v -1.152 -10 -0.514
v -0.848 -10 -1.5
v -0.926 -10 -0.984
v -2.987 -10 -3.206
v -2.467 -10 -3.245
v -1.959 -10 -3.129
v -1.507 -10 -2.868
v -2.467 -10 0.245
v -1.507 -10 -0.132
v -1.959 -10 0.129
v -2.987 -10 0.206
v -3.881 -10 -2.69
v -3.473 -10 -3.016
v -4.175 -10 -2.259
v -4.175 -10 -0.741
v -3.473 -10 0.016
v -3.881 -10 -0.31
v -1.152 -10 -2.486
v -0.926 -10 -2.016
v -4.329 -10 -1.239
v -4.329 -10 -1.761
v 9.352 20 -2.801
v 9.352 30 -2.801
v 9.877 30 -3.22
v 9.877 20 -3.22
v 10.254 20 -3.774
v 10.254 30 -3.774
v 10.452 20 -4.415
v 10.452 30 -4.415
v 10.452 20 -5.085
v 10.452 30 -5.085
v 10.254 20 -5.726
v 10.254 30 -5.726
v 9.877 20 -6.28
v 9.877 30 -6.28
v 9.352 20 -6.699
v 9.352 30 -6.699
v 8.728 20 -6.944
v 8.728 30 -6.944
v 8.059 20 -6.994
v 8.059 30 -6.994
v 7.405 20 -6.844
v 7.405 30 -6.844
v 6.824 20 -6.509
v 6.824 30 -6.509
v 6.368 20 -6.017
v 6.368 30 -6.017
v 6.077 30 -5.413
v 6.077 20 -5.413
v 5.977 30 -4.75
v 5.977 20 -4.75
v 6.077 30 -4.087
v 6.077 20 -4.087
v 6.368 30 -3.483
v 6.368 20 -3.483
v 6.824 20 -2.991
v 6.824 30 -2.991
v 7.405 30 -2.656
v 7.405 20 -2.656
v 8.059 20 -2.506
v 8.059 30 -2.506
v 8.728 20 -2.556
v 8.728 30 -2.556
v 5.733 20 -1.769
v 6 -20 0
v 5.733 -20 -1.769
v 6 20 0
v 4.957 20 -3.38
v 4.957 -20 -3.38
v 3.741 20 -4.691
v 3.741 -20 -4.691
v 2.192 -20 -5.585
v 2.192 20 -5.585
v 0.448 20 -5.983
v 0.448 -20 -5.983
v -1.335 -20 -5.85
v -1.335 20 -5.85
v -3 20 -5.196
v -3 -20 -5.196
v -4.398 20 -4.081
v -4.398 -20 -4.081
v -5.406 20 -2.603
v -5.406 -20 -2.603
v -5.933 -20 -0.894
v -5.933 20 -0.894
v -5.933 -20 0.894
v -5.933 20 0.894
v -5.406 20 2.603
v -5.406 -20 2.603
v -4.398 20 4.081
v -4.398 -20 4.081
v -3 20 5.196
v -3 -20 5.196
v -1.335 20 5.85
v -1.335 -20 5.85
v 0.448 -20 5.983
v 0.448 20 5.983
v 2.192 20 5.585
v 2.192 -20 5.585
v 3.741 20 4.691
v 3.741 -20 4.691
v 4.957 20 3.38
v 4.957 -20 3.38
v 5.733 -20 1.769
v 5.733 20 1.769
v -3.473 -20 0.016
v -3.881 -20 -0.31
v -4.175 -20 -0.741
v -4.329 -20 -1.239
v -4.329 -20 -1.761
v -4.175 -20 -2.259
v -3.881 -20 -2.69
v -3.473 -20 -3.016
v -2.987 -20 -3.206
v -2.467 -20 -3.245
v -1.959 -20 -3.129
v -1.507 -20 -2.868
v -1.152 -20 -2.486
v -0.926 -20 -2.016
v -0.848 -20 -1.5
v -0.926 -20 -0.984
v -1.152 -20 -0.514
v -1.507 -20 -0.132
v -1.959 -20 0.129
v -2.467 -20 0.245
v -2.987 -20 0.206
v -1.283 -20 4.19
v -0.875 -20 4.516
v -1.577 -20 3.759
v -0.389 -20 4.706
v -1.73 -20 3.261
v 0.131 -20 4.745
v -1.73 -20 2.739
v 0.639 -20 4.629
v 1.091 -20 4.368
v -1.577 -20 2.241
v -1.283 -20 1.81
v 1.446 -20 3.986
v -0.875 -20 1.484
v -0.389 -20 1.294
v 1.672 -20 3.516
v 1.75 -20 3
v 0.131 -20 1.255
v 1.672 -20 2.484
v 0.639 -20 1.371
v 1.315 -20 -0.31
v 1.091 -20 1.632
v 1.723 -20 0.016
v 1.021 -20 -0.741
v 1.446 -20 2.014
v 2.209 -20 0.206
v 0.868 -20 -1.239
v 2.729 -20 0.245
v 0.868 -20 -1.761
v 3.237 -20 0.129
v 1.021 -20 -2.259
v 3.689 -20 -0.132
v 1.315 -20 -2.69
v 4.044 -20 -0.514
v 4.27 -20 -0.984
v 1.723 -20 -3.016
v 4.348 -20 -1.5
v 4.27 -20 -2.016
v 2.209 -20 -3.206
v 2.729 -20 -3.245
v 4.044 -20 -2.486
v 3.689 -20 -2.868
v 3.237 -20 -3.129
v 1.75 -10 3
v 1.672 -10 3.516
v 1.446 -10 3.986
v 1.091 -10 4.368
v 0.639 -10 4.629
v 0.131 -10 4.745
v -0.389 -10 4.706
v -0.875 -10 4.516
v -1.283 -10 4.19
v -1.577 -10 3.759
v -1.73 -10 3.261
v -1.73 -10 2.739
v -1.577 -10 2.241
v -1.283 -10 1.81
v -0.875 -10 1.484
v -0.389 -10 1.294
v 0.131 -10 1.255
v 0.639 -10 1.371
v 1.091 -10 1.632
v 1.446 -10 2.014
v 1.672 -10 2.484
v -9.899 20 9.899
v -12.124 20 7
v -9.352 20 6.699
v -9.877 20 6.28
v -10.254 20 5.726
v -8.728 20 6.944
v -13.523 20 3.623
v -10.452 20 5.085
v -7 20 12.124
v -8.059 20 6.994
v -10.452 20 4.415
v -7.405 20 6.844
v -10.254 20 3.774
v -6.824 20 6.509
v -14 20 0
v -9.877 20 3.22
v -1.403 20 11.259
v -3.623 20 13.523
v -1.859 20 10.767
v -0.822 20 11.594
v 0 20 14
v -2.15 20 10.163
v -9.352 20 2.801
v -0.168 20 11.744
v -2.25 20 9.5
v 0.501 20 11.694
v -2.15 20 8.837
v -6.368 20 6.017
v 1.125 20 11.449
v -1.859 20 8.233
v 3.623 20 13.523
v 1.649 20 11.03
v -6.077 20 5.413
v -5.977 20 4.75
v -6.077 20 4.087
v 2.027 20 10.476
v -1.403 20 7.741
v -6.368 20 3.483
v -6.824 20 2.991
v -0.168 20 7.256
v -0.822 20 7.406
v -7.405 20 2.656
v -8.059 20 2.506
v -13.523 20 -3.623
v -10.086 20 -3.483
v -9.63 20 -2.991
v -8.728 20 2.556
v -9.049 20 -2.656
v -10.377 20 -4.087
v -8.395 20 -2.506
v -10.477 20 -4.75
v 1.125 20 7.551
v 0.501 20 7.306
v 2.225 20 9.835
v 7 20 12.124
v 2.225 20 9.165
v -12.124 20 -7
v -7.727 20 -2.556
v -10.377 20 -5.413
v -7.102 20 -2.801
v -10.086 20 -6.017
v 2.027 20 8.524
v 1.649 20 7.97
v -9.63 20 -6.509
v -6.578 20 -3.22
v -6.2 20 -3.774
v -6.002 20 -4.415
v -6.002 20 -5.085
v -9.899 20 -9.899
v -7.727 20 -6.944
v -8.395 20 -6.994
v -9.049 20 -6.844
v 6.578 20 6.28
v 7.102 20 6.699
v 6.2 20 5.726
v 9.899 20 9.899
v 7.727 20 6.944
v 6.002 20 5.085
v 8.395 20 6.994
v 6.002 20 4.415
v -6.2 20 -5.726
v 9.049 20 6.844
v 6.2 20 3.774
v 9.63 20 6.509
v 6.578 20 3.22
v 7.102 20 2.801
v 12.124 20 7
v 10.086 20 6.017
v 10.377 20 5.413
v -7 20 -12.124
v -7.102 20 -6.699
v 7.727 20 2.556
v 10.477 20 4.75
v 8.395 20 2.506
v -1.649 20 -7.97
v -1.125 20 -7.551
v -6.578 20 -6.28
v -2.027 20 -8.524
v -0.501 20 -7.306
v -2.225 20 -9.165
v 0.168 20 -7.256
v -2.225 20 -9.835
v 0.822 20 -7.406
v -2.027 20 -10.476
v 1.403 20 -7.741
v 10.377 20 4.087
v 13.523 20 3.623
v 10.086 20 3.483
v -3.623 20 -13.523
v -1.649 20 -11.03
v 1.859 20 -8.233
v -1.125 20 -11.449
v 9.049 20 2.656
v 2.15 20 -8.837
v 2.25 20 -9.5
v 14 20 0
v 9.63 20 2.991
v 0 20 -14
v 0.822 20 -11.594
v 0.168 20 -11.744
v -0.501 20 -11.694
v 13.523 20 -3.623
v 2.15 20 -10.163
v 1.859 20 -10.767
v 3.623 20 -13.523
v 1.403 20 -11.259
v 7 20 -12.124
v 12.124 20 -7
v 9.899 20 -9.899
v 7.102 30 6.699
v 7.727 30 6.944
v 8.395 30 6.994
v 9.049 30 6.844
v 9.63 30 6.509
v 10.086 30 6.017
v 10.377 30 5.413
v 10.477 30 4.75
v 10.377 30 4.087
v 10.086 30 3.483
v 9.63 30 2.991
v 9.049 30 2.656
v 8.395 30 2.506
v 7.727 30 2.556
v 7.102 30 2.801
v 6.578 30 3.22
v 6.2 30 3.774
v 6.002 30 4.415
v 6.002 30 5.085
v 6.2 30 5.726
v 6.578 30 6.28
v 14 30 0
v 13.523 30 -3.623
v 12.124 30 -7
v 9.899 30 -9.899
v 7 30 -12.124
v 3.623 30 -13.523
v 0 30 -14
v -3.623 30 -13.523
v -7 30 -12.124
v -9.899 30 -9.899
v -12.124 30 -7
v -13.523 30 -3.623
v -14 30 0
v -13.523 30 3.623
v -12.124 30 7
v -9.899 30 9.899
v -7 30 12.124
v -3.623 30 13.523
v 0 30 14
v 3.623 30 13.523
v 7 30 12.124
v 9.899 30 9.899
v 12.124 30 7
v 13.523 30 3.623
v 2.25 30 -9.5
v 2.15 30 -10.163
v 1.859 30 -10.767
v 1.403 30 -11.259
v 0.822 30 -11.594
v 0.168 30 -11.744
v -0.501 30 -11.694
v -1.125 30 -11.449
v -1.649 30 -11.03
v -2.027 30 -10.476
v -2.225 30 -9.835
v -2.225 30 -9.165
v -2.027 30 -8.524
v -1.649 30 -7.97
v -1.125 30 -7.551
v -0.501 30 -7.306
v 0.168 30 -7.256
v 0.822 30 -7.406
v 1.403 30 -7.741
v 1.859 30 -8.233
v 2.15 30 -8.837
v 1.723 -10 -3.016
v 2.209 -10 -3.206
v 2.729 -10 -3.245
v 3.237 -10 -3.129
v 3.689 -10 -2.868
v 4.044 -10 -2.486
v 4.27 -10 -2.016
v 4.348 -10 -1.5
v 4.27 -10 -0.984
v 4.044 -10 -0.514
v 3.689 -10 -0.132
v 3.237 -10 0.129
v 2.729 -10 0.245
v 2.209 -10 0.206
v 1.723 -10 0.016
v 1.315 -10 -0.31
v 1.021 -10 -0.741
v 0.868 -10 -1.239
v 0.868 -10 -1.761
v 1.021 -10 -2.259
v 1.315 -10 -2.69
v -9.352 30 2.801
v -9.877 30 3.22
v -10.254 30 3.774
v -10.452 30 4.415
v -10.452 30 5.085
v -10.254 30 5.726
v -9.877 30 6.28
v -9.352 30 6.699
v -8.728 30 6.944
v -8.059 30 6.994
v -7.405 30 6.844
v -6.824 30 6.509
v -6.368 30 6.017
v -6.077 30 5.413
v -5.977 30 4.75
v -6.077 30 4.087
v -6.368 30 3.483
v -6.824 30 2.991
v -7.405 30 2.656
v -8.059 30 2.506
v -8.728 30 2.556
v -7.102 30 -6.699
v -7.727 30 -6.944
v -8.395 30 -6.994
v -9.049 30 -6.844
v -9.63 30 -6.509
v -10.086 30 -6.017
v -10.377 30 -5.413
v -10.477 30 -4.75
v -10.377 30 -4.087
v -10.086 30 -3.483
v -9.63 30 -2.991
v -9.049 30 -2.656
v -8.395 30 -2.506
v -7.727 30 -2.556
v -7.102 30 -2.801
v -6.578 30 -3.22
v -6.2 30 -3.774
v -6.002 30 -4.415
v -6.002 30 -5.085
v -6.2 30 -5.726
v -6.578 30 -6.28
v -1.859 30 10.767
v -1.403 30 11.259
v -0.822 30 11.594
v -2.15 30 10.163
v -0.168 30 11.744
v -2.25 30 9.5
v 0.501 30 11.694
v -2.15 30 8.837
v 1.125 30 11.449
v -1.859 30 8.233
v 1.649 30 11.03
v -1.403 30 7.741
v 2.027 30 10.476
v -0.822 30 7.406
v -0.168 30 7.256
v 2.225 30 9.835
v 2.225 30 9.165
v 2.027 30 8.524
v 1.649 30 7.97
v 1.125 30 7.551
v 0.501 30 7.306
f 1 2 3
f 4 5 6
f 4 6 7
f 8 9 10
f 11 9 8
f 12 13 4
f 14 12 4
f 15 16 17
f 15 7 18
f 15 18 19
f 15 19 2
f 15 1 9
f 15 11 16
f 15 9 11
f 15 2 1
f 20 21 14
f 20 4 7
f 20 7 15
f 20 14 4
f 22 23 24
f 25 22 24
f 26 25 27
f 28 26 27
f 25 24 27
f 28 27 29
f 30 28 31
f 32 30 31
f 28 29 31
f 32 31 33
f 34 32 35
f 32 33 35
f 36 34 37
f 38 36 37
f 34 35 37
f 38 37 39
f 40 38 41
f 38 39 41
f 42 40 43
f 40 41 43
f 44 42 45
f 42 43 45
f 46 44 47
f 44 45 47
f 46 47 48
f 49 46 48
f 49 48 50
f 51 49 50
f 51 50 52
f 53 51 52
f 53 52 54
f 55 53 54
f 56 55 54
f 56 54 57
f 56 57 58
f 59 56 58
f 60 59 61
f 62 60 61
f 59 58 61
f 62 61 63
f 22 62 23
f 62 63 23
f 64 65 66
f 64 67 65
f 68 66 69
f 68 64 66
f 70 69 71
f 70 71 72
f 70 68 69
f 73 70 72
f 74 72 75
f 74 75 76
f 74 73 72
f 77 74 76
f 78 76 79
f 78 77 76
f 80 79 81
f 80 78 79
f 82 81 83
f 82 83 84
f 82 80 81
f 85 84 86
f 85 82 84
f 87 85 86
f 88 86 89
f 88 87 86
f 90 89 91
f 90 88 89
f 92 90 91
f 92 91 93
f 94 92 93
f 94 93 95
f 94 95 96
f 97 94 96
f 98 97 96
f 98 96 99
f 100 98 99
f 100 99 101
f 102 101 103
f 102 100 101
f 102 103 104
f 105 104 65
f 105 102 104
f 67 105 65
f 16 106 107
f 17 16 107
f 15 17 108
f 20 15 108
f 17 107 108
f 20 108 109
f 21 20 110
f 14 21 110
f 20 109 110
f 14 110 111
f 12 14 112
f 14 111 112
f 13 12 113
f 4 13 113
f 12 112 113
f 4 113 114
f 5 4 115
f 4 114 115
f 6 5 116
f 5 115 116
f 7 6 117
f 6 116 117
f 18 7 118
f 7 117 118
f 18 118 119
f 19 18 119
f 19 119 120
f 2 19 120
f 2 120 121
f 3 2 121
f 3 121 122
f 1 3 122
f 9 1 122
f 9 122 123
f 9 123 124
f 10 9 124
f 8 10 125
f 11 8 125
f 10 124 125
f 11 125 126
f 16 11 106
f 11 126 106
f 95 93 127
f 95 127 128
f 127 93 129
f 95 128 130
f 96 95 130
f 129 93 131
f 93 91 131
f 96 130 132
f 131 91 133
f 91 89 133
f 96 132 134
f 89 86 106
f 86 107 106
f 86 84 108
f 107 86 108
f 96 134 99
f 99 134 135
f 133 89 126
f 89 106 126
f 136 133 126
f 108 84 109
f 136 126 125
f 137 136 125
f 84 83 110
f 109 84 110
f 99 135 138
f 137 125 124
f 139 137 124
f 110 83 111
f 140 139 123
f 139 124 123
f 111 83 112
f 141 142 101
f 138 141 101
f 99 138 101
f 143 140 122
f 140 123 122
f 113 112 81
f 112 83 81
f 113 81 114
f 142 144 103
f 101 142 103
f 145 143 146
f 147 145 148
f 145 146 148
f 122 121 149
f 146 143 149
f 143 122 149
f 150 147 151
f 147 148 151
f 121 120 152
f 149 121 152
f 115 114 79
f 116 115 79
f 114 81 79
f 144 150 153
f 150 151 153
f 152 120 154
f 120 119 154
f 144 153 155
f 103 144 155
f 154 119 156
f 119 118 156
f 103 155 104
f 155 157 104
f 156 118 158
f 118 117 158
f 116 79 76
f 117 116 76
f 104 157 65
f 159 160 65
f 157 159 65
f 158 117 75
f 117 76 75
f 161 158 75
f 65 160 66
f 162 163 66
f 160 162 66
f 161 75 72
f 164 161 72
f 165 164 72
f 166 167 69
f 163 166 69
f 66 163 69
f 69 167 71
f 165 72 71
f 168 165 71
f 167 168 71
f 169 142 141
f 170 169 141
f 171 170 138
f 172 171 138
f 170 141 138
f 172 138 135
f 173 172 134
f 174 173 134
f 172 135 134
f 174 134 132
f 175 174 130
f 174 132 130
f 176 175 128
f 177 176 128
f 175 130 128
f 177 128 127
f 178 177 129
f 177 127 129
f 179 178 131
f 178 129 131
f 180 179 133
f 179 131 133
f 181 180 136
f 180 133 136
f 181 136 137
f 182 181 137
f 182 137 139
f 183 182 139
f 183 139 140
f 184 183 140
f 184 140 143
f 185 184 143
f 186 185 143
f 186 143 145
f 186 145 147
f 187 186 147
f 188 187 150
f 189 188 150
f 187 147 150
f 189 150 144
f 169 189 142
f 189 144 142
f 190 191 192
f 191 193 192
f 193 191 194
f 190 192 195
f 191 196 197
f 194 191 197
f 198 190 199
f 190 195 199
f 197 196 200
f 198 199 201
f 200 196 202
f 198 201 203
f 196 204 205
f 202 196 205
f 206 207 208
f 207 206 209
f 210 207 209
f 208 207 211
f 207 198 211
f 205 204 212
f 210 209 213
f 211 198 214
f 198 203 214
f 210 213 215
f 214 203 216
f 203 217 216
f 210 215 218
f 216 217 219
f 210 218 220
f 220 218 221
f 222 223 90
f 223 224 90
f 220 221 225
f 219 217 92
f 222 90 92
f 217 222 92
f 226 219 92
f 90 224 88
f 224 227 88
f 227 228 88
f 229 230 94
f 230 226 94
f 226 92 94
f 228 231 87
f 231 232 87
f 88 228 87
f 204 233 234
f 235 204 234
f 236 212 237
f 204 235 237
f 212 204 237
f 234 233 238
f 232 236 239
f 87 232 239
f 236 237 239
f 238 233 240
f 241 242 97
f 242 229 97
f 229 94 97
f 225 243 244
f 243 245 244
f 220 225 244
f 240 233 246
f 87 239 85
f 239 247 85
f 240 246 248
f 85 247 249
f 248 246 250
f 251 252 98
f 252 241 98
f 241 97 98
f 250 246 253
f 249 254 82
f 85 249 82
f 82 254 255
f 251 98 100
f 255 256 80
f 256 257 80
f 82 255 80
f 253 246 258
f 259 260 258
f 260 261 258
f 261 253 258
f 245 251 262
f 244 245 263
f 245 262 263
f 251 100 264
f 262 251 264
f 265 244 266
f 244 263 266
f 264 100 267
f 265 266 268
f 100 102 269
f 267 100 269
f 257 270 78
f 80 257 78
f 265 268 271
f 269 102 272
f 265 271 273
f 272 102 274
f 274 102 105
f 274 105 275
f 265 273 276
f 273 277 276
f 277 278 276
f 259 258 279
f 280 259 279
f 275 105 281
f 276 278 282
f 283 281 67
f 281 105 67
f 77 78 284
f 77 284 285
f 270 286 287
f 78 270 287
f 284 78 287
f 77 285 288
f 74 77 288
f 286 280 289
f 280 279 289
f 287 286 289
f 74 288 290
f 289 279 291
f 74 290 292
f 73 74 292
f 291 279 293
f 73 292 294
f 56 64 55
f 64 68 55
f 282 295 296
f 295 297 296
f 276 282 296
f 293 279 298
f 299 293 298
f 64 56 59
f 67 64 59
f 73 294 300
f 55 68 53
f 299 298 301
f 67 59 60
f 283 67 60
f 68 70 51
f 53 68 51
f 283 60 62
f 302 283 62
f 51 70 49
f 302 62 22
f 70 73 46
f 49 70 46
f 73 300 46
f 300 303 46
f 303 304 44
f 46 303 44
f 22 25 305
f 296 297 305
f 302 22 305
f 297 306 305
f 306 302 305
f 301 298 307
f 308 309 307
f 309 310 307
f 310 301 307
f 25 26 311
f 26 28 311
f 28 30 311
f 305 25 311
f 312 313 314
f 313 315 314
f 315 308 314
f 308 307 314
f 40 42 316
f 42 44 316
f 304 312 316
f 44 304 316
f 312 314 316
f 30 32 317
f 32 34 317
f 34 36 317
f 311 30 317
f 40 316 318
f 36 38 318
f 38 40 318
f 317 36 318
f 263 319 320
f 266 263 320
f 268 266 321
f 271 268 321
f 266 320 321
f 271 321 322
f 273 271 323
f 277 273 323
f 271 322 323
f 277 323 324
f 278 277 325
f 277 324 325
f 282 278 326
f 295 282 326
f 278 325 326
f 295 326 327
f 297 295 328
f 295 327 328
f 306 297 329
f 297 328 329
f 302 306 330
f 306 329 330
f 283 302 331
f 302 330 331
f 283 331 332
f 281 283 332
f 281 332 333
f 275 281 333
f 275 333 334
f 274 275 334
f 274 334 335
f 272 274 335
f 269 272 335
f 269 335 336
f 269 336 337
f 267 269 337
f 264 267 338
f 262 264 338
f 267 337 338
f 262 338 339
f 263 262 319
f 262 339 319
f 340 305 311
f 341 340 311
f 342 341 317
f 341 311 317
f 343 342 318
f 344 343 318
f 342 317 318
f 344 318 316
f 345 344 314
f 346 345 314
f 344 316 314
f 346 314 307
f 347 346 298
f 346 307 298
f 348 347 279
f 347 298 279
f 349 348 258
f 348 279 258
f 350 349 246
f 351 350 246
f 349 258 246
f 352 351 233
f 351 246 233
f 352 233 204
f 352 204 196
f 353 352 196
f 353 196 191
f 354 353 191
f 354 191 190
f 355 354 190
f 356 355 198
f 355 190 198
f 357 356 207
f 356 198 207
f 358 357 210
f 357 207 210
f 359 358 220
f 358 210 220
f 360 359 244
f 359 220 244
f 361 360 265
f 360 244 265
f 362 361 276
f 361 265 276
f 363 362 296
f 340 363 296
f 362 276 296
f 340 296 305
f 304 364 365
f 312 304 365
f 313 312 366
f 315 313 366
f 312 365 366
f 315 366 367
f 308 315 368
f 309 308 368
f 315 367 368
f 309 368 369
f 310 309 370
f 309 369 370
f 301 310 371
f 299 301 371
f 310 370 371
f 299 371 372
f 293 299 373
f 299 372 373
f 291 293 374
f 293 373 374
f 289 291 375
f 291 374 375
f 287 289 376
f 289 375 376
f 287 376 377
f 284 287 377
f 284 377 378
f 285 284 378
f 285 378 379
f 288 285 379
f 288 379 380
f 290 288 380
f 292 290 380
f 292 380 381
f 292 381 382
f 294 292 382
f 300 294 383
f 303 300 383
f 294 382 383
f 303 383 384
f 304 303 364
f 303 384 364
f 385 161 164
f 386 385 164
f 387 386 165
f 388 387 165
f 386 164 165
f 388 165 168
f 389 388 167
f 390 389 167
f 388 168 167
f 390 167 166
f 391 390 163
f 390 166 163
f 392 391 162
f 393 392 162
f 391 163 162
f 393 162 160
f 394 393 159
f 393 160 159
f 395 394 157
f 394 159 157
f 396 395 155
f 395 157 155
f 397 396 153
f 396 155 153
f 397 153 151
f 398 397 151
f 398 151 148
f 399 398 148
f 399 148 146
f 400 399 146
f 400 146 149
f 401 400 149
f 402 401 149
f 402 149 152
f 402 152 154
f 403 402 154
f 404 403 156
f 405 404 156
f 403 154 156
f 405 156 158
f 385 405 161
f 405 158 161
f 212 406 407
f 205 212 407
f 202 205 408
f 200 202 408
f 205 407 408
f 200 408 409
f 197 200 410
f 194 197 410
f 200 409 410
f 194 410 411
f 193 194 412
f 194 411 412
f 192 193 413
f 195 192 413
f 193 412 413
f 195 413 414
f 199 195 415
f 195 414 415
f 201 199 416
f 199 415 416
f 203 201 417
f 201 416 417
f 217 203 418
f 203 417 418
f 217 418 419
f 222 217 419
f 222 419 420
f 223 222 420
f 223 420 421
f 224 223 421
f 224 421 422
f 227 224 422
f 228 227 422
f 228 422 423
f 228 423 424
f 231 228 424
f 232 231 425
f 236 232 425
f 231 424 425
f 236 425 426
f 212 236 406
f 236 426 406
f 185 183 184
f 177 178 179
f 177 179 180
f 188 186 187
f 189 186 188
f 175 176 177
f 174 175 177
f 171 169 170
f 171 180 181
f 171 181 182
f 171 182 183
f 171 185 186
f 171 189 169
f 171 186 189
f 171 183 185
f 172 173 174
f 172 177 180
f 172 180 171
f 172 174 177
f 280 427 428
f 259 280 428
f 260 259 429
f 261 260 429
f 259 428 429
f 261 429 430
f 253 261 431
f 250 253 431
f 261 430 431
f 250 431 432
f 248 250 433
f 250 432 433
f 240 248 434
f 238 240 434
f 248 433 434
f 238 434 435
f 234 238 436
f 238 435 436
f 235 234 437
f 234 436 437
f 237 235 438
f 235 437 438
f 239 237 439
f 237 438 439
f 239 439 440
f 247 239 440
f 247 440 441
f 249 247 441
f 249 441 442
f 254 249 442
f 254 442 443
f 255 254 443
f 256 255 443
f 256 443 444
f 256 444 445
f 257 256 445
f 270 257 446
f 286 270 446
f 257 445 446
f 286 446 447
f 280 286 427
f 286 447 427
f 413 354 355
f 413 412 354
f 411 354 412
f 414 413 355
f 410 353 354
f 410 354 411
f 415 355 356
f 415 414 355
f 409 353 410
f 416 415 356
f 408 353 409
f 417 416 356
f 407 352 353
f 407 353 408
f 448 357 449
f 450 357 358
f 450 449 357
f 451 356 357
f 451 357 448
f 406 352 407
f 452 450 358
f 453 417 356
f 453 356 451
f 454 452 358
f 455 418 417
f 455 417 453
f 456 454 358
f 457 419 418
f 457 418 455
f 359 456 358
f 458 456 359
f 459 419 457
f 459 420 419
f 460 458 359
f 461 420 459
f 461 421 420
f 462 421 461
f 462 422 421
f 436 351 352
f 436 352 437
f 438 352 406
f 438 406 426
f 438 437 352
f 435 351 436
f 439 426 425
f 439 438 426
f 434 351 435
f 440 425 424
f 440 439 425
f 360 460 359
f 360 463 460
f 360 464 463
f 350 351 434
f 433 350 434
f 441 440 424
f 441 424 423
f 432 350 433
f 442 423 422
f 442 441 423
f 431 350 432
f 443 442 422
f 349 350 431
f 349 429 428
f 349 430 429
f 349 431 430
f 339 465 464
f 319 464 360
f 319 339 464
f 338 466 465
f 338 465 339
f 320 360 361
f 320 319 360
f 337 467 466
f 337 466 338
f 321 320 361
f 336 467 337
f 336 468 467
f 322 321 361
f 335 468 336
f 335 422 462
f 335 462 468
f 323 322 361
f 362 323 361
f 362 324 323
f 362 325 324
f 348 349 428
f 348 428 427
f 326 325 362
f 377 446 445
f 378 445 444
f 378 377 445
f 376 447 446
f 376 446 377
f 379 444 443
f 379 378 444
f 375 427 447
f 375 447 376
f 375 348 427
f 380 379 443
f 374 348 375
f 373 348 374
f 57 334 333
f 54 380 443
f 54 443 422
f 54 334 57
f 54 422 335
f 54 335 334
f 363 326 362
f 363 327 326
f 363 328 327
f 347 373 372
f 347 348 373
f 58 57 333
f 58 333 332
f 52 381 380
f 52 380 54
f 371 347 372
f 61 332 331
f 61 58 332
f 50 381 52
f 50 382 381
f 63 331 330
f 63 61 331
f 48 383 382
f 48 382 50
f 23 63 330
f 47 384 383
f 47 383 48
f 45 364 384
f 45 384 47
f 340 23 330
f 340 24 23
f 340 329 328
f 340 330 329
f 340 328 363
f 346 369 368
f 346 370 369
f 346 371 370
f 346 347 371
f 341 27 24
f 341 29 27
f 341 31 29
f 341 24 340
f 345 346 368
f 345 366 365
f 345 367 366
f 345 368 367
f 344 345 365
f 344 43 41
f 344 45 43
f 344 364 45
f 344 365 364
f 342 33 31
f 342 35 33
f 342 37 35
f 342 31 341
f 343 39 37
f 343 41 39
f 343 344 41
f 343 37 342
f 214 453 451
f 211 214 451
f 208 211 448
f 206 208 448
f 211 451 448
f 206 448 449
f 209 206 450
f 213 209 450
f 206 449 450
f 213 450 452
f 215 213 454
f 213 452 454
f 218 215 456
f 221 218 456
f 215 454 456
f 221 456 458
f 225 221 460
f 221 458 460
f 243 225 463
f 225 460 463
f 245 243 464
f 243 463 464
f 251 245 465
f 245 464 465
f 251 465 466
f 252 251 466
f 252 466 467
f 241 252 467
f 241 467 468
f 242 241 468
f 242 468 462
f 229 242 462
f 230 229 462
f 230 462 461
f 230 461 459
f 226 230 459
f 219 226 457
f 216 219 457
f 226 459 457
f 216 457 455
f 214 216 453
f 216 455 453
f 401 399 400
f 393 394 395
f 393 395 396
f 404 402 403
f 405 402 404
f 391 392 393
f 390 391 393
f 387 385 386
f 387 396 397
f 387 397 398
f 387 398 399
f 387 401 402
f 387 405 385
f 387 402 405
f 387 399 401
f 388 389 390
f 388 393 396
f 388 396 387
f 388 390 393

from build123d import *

# Parameters (mm, degrees)
SKETCH1_R           = 6
BOSS_EXTRUDE1_DEPTH = 20
SKETCH4_R           = 14
BOSS_EXTRUDE2_DEPTH = 10
SKETCH5_R           = 2.25
CUT_EXTRUDE2_DEPTH  = 10
CIRPATTERN1_COUNT   = 6
SKETCH7_R           = 1.75
CUT_EXTRUDE3_DEPTH  = 10
CIRPATTERN2_COUNT   = 3


with BuildPart() as part:
    # Sketch1 → Boss-Extrude1 (new body, symmetric)
    with BuildSketch(Plane(origin=(0, 0, 0), x_dir=(1, 0, 0), z_dir=(0, 1, 0))):
        Circle(SKETCH1_R)
    extrude(amount=BOSS_EXTRUDE1_DEPTH, both=True)

    # Sketch4 → Boss-Extrude2 (add)
    with BuildSketch(Plane(origin=(0, 20, 0), x_dir=(1, 0, 0), z_dir=(0, 1, 0))):
        Circle(SKETCH4_R)
    extrude(amount=BOSS_EXTRUDE2_DEPTH)

    # Sketch5 → Cut-Extrude2 (cut)
    with BuildSketch(Plane(origin=(0, 30, 0), x_dir=(1, 0, 0), z_dir=(0, 1, 0))):
        with Locations((0, 9.5)):
            Circle(SKETCH5_R)
    cut_extrude2 = extrude(amount=-CUT_EXTRUDE2_DEPTH, mode=Mode.SUBTRACT)

    # CirPattern1: Cut-Extrude2 ×6 about axis
    cirpattern1_axis = Axis((0, 0, 0), (0, 1, 0))
    for i in range(1, CIRPATTERN1_COUNT):
        add(cut_extrude2.rotate(cirpattern1_axis, i * 360 / CIRPATTERN1_COUNT), mode=Mode.SUBTRACT)

    # Sketch7 → Cut-Extrude3 (cut)
    with BuildSketch(Plane.XZ.offset(20)):
        with Locations((0, 3)):
            Circle(SKETCH7_R)
    cut_extrude3 = extrude(amount=-CUT_EXTRUDE3_DEPTH, mode=Mode.SUBTRACT)

    # CirPattern2: Cut-Extrude3 ×3 about axis
    cirpattern2_axis = Axis((0, 0, 0), (0, 1, 0))
    for i in range(1, CIRPATTERN2_COUNT):
        add(cut_extrude3.rotate(cirpattern2_axis, i * 360 / CIRPATTERN2_COUNT), mode=Mode.SUBTRACT)


solid = part.part
